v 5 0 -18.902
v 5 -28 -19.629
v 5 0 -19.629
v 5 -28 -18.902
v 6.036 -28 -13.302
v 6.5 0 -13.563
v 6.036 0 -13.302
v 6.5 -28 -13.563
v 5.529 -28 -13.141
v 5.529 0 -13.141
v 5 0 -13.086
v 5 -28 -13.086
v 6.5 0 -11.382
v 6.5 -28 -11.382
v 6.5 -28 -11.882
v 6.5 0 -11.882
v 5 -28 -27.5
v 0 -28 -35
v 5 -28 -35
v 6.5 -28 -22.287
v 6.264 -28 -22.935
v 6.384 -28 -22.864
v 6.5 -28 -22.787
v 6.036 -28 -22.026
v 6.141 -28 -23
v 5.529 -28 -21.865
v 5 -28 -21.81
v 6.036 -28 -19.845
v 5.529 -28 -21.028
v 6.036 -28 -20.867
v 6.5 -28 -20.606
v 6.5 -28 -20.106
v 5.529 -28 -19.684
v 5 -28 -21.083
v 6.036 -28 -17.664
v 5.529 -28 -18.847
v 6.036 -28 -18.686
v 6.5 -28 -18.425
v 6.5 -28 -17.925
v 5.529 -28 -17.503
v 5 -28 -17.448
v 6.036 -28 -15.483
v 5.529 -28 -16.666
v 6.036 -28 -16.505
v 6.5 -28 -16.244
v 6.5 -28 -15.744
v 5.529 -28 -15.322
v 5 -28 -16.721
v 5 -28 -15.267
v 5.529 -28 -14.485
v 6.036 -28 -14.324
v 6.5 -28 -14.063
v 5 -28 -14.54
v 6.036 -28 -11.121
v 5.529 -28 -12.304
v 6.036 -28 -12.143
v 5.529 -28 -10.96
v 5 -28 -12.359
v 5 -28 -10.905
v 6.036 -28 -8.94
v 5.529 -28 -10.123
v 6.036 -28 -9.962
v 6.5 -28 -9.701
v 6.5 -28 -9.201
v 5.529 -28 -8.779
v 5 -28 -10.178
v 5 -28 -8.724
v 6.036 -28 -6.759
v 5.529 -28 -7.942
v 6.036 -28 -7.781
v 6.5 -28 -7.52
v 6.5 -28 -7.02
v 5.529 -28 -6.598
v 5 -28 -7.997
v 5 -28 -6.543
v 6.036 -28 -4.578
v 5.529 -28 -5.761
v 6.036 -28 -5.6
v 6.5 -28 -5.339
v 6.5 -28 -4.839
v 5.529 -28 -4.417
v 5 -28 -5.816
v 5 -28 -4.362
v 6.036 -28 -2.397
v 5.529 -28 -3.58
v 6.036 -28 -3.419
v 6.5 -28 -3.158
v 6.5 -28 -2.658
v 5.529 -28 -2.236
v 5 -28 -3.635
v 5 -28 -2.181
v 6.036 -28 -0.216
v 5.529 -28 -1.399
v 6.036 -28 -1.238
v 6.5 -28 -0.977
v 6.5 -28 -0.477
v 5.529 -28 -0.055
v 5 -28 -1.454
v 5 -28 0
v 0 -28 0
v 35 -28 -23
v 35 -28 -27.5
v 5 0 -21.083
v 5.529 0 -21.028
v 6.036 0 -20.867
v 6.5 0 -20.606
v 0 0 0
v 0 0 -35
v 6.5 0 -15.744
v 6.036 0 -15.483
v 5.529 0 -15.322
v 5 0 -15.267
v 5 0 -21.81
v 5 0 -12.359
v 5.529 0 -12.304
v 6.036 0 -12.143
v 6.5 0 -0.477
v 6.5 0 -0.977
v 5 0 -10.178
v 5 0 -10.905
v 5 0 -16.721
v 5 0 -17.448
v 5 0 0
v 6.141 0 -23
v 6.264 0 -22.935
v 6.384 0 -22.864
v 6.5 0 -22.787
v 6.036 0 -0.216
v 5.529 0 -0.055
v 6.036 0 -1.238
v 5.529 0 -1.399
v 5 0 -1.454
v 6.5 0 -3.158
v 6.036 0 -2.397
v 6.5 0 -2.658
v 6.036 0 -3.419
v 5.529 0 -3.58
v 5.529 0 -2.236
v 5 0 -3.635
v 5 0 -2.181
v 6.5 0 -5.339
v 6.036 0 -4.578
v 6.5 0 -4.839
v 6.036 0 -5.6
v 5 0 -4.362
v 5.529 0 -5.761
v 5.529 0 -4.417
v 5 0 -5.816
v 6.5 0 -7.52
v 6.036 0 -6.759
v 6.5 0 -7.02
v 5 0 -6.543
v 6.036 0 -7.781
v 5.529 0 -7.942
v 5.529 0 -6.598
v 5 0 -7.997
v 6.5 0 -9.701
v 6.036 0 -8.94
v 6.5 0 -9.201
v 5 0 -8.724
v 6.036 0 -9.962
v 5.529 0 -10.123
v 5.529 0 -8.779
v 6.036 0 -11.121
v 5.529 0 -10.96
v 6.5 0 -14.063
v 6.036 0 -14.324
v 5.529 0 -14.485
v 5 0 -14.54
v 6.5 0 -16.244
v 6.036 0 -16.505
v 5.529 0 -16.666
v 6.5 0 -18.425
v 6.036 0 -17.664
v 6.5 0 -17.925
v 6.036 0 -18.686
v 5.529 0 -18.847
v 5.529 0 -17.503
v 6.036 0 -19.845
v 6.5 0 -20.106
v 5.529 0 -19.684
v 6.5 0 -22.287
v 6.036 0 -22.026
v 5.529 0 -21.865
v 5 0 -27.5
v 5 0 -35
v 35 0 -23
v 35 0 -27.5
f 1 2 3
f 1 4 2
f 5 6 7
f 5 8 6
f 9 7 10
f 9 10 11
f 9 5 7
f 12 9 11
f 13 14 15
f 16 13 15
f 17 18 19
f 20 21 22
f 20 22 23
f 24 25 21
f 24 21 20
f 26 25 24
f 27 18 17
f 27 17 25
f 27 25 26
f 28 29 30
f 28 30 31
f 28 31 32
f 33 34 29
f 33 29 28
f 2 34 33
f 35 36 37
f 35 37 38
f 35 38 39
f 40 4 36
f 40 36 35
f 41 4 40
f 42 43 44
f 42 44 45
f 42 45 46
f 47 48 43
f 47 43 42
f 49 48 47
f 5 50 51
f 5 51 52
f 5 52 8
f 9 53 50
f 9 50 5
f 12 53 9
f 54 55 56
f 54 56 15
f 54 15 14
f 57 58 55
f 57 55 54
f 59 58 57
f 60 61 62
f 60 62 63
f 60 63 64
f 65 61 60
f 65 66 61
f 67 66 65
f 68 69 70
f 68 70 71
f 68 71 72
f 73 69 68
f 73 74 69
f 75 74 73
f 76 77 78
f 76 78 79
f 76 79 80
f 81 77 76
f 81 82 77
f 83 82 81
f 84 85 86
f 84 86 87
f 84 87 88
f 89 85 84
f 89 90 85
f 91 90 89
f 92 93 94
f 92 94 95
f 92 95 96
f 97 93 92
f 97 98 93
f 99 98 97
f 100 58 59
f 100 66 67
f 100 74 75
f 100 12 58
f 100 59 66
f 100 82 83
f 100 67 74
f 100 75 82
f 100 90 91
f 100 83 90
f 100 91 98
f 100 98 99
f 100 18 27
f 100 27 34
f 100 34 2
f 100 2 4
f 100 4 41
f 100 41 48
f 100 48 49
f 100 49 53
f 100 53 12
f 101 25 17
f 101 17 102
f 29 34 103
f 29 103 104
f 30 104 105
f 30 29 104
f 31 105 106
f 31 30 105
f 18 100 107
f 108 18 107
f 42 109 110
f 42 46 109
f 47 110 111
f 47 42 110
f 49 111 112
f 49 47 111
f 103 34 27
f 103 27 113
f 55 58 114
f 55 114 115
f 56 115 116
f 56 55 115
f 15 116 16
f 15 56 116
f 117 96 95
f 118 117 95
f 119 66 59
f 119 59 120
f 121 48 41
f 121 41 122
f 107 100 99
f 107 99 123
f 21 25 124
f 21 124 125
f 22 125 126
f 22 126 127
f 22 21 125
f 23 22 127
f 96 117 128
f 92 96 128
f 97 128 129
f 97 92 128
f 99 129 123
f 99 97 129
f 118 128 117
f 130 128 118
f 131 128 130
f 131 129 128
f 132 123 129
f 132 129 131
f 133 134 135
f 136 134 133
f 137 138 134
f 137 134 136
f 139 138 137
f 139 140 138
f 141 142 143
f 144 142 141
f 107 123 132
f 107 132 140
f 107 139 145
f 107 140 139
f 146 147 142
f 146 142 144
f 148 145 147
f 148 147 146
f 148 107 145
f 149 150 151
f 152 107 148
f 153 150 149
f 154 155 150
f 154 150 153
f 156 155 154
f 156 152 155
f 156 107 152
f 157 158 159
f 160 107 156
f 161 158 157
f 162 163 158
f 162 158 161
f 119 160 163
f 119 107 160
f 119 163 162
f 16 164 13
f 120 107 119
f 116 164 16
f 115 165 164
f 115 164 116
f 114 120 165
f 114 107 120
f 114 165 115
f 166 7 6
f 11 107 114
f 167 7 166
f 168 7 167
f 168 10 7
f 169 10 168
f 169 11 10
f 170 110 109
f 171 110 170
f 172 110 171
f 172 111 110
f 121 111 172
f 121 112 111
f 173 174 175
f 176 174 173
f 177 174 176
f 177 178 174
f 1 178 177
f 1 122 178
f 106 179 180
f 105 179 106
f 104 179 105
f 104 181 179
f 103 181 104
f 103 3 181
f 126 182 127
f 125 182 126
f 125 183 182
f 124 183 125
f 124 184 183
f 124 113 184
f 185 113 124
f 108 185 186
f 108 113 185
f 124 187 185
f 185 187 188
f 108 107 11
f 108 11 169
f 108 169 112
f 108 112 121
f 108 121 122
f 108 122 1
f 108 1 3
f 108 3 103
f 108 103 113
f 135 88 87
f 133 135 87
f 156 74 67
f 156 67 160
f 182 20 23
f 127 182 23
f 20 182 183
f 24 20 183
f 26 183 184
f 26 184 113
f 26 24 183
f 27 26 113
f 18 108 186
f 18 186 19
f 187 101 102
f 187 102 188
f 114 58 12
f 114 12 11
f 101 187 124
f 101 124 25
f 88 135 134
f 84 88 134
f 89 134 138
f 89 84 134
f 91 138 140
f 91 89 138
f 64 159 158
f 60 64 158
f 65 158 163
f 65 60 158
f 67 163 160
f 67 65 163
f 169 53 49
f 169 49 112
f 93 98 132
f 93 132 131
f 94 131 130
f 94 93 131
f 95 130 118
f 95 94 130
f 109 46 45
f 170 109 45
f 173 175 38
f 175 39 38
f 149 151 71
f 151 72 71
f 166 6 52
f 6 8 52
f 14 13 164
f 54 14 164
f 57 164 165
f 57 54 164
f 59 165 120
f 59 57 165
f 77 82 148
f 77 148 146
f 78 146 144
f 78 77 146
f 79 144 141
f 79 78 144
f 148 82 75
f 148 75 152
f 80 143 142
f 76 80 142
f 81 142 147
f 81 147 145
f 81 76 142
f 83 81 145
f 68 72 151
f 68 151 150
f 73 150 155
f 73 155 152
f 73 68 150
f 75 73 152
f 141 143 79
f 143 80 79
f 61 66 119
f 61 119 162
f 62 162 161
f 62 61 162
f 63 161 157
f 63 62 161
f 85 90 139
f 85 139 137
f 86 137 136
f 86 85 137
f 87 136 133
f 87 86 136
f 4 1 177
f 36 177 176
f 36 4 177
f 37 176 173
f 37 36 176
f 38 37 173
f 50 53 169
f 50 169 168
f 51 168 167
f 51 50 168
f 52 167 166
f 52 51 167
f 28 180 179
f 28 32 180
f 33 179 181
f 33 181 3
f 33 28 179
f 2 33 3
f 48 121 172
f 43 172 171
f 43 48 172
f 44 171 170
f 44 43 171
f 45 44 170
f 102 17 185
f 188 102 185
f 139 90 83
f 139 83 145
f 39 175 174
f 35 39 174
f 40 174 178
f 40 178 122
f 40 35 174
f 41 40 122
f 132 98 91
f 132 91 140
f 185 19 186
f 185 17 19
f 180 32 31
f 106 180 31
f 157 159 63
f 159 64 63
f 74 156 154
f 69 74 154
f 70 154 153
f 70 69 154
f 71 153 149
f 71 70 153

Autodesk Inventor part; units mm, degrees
ref_plane "YZ Plane" through (0, 0, 0) normal (1, 0, 0) x (0, 1, 0)
ref_plane "XZ Plane" through (0, 0, 0) normal (0, 1, 0) x (-1, 0, 0)
ref_plane "XY Plane" through (0, 0, 0) normal (0, 0, 1) x (1, 0, 0)
sketch "스케치1" plane through (0, 0, 0) normal (1, 0, 0) x (0, 1, 0)
  line L0 (0, 0) -> (0, -35)
  line L1 (0, -35) -> (-28, -35)
  line L2 (-28, -35) -> (-28, 0)
  line L3 (-28, 0) -> (0, 0)
  line L4 (0, -23) -> (-28, -23)
  line L5 (-28, -23) -> (-28, -27.5)
  line L6 (-28, -27.5) -> (0, -27.5)
  line L7 (0, -27.5) -> (0, -23)
  point P0 (0, -27.5)
  dimension "d0" = 35
  dimension "d1" = 28
  dimension "d2" = 7.5
  dimension "d3" = 4.5
extrude "돌출1" add sketch "스케치1" along normal blind 5 contours L0 L1 L2 L6
extrude "돌출2" add sketch "스케치1" along normal blind 35 contours L0 L6 L2 L4
extrude "돌출3" add sketch "스케치1" along normal blind 5 contours L0 L4 L2 L3
sketch "스케치2" plane through (5, 0, 0) normal (1, 0, 0) x (0, 0, -1)
  point P0 (0, 0)
sketch "스케치3" plane through (0, -28, -35) normal (0, -1, 0) x (1, 0, 0)
  line L0 (0, 35) -> (5, 35) projected
  arc A0 (6.5, 34.523) -> (5, 35) centre (5, 32.403) ccw
  arc A1 (5, 33.546) -> (6.5, 34.023) centre (5, 36.143) ccw
  line L1 (5, 35) -> (9.1174, 35) construction
  line L2 (5, 33.546) -> (9.1174, 33.546) construction
  line L3 (5, 35) -> (5, 12) construction
  line L4 (6.5, 34.523) -> (6.5, 34.023)
  line L5 (5, 35) -> (5, 33.546)
  arc A2 (6.5, 32.342) -> (5, 32.819) centre (5, 30.222) ccw
  arc A3 (5, 31.365) -> (6.5, 31.842) centre (5, 33.962) ccw
  line L6 (5, 32.819) -> (9.1174, 32.819) construction
  line L7 (5, 31.365) -> (9.1174, 31.365) construction
  line L8 (6.5, 32.342) -> (6.5, 31.842)
  line L9 (5, 32.819) -> (5, 31.365)
  arc A4 (6.5, 30.161) -> (5, 30.638) centre (5, 28.041) ccw
  arc A5 (5, 29.184) -> (6.5, 29.661) centre (5, 31.781) ccw
  line L10 (5, 30.638) -> (9.1174, 30.638) construction
  line L11 (5, 29.184) -> (9.1174, 29.184) construction
  line L12 (6.5, 30.161) -> (6.5, 29.661)
  line L13 (5, 30.638) -> (5, 29.184)
  arc A6 (6.5, 27.98) -> (5, 28.457) centre (5, 25.86) ccw
  arc A7 (5, 27.003) -> (6.5, 27.48) centre (5, 29.6) ccw
  line L14 (5, 28.457) -> (9.1174, 28.457) construction
  line L15 (5, 27.003) -> (9.1174, 27.003) construction
  line L16 (6.5, 27.98) -> (6.5, 27.48)
  line L17 (5, 28.457) -> (5, 27.003)
  arc A8 (6.5, 25.799) -> (5, 26.276) centre (5, 23.679) ccw
  arc A9 (5, 24.822) -> (6.5, 25.299) centre (5, 27.419) ccw
  line L18 (5, 26.276) -> (9.1174, 26.276) construction
  line L19 (5, 24.822) -> (9.1174, 24.822) construction
  line L20 (6.5, 25.799) -> (6.5, 25.299)
  line L21 (5, 26.276) -> (5, 24.822)
  arc A10 (6.5, 23.618) -> (5, 24.095) centre (5, 21.498) ccw
  arc A11 (5, 22.641) -> (6.5, 23.118) centre (5, 25.238) ccw
  line L22 (5, 24.095) -> (9.1174, 24.095) construction
  line L23 (5, 22.641) -> (9.1174, 22.641) construction
  line L24 (6.5, 23.618) -> (6.5, 23.118)
  line L25 (5, 24.095) -> (5, 22.641)
  arc A12 (6.5, 21.437) -> (5, 21.914) centre (5, 19.317) ccw
  arc A13 (5, 20.46) -> (6.5, 20.937) centre (5, 23.057) ccw
  line L26 (5, 21.914) -> (9.1174, 21.914) construction
  line L27 (5, 20.46) -> (9.1174, 20.46) construction
  line L28 (6.5, 21.437) -> (6.5, 20.937)
  line L29 (5, 21.914) -> (5, 20.46)
  arc A14 (6.5, 19.256) -> (5, 19.733) centre (5, 17.136) ccw
  arc A15 (5, 18.279) -> (6.5, 18.756) centre (5, 20.876) ccw
  line L30 (5, 19.733) -> (9.1174, 19.733) construction
  line L31 (5, 18.279) -> (9.1174, 18.279) construction
  line L32 (6.5, 19.256) -> (6.5, 18.756)
  line L33 (5, 19.733) -> (5, 18.279)
  arc A16 (6.5, 17.075) -> (5, 17.552) centre (5, 14.955) ccw
  arc A17 (5, 16.098) -> (6.5, 16.575) centre (5, 18.695) ccw
  line L34 (5, 17.552) -> (9.1174, 17.552) construction
  line L35 (5, 16.098) -> (9.1174, 16.098) construction
  line L36 (6.5, 17.075) -> (6.5, 16.575)
  line L37 (5, 17.552) -> (5, 16.098)
  arc A18 (6.5, 14.894) -> (5, 15.371) centre (5, 12.774) ccw
  arc A19 (5, 13.917) -> (6.5, 14.394) centre (5, 16.514) ccw
  line L38 (5, 15.371) -> (9.1174, 15.371) construction
  line L39 (5, 13.917) -> (9.1174, 13.917) construction
  line L40 (6.5, 14.894) -> (6.5, 14.394)
  line L41 (5, 15.371) -> (5, 13.917)
  arc A20 (6.5, 12.713) -> (5, 13.19) centre (5, 10.593) ccw
  arc A21 (5, 11.736) -> (6.5, 12.213) centre (5, 14.333) ccw
  line L42 (5, 13.19) -> (9.1174, 13.19) construction
  line L43 (5, 11.736) -> (9.1174, 11.736) construction
  line L44 (6.5, 12.713) -> (6.5, 12.213)
  line L45 (5, 13.19) -> (5, 11.736)
  point P0 (6.5, 34.273)
  point P1 (5, 34.273)
  point P2 (6.5, 32.092)
  point P3 (5, 32.092)
  point P4 (6.5, 29.911)
  point P5 (5, 29.911)
  point P6 (6.5, 27.73)
  point P7 (5, 27.73)
  point P8 (6.5, 25.549)
  point P9 (5, 25.549)
  point P10 (6.5, 23.368)
  point P11 (5, 23.368)
  point P12 (6.5, 21.187)
  point P13 (5, 21.187)
  point P14 (6.5, 19.006)
  point P15 (5, 19.006)
  point P16 (6.5, 16.825)
  point P17 (5, 16.825)
  point P18 (6.5, 14.644)
  point P19 (5, 14.644)
  point P20 (6.5, 12.463)
  point P21 (5, 12.463)
  dimension "d10" = 1.454
  dimension "d11" = 0.5
  dimension "d12" = 1.5
  dimension "d15" = 2.181
extrude "돌출4" add sketch "스케치3" against normal up to surface (28 mm away)
properties part number "stopper"
